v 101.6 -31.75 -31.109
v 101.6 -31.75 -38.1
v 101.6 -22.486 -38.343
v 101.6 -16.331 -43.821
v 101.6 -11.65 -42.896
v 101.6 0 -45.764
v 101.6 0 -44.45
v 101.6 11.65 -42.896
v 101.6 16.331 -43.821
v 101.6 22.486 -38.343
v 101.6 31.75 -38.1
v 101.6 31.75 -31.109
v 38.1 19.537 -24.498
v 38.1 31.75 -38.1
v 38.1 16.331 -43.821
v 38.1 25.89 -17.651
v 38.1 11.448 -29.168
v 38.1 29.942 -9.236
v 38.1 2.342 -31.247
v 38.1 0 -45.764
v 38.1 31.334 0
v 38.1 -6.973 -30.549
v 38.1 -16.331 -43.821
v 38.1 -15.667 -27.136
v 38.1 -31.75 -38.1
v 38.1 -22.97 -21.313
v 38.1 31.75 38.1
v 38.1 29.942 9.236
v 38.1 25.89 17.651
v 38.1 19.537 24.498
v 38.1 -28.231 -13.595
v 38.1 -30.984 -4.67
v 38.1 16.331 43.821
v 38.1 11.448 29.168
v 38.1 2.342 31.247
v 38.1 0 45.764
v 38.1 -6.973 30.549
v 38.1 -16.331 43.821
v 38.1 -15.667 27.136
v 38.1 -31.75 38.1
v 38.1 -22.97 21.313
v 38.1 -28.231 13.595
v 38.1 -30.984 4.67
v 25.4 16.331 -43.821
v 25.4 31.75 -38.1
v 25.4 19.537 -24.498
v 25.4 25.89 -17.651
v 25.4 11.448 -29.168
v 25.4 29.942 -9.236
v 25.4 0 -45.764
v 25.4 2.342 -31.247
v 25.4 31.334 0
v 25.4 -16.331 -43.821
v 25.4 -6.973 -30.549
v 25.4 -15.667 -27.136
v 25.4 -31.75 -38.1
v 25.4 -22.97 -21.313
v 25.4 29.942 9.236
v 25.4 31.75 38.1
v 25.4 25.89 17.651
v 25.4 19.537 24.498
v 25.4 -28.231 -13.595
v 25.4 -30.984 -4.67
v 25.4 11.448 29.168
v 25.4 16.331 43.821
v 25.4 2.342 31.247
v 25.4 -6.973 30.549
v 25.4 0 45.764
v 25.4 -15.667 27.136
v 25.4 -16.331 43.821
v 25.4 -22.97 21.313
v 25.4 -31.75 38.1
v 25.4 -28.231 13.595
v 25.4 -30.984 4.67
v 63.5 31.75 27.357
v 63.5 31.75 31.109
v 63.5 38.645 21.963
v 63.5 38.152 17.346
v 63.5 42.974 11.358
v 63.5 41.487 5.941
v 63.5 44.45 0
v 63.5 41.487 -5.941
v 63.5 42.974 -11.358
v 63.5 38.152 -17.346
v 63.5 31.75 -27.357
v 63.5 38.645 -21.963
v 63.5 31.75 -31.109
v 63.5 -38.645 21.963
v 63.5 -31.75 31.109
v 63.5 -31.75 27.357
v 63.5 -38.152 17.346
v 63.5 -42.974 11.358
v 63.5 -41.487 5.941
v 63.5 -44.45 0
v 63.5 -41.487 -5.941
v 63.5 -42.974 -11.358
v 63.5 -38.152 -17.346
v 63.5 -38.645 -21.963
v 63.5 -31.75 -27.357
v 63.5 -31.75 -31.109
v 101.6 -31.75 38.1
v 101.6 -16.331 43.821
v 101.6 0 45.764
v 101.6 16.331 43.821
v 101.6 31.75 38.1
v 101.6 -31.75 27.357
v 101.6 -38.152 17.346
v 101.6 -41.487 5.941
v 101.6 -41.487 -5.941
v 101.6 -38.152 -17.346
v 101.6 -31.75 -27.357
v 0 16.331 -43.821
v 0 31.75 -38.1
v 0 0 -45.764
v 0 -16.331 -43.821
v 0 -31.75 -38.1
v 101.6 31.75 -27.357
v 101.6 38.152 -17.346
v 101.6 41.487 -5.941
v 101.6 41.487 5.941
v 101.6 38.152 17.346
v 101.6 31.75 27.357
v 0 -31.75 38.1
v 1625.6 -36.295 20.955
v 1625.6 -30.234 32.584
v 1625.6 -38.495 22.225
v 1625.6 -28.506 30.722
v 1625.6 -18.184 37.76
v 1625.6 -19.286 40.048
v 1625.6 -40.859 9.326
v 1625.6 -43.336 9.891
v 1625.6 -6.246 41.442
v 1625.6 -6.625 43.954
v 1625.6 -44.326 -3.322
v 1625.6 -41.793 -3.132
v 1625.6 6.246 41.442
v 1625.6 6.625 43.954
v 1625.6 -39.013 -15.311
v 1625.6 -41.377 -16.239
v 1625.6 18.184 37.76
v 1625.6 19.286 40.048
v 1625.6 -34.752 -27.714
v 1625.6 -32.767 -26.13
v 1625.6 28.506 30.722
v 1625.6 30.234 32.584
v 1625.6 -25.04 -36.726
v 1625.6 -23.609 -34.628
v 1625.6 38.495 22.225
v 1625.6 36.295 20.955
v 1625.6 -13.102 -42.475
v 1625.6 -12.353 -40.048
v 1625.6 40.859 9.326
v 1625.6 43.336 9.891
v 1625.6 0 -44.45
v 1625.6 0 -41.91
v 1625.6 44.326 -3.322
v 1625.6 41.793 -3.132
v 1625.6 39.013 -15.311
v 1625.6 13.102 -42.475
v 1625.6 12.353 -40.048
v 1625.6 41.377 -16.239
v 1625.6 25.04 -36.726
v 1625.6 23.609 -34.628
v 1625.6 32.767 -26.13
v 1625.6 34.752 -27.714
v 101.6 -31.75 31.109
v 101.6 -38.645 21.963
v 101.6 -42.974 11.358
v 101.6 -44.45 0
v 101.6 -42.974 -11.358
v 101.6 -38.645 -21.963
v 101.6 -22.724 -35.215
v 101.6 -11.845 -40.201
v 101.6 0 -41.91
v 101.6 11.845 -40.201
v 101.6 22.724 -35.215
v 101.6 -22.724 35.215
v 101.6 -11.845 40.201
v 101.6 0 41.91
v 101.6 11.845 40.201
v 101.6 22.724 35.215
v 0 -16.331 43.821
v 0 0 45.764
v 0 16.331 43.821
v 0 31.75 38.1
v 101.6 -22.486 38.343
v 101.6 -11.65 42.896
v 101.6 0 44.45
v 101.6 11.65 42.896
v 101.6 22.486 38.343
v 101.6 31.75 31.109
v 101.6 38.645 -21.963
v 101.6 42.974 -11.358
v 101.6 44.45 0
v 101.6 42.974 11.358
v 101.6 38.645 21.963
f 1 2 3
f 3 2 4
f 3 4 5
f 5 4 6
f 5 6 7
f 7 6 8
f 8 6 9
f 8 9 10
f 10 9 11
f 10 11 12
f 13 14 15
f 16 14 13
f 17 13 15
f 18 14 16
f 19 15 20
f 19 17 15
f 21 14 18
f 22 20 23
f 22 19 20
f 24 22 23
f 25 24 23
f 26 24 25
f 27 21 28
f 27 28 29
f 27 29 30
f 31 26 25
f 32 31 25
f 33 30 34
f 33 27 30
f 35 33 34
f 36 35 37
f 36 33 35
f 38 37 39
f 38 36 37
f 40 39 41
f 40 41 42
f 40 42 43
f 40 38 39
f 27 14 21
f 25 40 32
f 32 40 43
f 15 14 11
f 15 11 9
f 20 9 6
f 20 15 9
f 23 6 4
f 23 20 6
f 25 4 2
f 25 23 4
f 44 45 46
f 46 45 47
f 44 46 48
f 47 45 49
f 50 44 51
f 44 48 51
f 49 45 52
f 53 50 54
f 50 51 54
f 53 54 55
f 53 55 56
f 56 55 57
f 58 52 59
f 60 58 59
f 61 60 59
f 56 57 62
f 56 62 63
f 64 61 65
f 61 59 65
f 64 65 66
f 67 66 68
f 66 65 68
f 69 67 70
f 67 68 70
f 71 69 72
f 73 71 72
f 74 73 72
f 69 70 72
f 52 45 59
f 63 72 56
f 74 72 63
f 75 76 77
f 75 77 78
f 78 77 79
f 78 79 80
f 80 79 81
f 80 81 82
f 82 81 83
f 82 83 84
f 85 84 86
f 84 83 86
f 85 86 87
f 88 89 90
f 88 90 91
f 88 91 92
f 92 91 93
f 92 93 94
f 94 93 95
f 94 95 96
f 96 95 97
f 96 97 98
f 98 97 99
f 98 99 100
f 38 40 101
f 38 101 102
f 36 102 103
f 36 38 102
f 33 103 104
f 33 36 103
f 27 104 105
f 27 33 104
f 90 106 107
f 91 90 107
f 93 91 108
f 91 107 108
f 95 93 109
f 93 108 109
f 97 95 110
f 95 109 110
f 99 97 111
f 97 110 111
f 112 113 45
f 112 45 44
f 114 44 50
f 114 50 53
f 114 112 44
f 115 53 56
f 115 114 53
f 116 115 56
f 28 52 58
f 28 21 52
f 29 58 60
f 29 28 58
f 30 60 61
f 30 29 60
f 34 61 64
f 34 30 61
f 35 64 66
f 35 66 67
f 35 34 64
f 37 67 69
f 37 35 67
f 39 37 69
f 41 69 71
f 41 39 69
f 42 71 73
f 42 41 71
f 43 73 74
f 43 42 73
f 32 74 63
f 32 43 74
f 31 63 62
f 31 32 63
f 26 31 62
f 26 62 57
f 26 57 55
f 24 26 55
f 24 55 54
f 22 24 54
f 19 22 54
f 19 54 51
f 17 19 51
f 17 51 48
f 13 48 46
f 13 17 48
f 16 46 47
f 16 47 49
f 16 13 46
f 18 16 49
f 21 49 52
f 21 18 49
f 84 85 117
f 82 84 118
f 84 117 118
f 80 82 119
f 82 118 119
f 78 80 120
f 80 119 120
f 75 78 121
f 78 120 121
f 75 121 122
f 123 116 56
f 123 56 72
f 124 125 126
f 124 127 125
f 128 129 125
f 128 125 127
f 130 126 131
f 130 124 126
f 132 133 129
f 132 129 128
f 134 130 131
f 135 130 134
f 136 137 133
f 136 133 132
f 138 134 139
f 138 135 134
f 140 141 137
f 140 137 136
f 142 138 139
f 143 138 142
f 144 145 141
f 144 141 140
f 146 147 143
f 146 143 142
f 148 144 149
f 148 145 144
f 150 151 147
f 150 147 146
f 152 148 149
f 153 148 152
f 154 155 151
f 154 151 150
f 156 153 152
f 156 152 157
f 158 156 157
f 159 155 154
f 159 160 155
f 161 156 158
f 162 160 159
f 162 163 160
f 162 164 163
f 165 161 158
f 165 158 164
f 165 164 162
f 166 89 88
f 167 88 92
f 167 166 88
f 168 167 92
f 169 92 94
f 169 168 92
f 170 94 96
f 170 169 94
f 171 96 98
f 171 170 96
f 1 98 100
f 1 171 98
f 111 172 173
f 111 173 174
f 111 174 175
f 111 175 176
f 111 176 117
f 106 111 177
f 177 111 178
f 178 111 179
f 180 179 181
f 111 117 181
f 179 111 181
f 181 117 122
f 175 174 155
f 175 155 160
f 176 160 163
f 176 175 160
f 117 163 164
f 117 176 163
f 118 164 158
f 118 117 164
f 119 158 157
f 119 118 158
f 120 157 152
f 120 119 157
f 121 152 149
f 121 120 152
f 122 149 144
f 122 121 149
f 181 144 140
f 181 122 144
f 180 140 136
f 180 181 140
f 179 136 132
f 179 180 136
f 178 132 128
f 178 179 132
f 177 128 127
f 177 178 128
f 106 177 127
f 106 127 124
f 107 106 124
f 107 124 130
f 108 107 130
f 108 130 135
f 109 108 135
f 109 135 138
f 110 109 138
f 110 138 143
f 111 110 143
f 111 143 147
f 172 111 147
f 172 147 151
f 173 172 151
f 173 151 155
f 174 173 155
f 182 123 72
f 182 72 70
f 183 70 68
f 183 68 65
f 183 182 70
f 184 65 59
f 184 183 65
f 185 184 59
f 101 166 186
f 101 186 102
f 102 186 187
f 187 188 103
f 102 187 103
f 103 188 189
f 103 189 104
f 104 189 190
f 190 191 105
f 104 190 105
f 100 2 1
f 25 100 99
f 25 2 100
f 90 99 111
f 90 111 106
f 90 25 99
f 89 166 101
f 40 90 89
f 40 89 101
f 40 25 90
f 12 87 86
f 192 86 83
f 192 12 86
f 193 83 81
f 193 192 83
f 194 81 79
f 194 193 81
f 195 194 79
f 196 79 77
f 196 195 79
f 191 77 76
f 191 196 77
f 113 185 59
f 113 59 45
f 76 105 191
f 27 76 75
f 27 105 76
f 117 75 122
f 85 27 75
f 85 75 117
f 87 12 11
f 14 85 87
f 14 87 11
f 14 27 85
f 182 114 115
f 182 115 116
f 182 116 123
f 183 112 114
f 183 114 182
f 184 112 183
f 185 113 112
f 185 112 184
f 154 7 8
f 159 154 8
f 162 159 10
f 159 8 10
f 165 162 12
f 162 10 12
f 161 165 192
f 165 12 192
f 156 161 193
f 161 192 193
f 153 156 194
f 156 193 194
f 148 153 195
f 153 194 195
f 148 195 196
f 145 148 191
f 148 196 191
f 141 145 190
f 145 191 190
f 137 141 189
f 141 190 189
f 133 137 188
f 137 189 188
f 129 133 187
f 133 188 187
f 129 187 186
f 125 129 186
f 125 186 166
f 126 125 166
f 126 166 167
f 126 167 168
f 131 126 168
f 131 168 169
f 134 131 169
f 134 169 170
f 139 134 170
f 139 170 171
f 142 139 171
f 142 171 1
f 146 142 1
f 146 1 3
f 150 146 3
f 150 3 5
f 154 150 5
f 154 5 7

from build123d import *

# Parameters (mm, degrees)
BOSS_EXTRUDE1_DEPTH = 101.6
SKETCH2_W           = 12.7
SKETCH2_H           = 25.4
SKETCH3_R           = 44.45
SKETCH3_R_2         = 41.91
BOSS_EXTRUDE2_DEPTH = 1524
BOSS_EXTRUDE3_START = -38.1
SKETCH3_2_R         = 44.45
SKETCH3_2_R_2       = 41.91
BOSS_EXTRUDE3_DEPTH = 38.1


with BuildPart() as part:
    # Sketch1 → Boss-Extrude1 (new body)
    with BuildSketch(Plane(origin=(0, 0, 0), x_dir=(0, 0, -1), z_dir=(1, 0, 0))):
        with BuildLine():
            Line((-38.1, 31.75), (38.1, 31.75))
            ThreePointArc((38.1, 31.75), (45.764257606, 0), (38.1, -31.75))
            Line((38.1, -31.75), (-38.1, -31.75))
            ThreePointArc((-38.1, -31.75), (-45.764257606, 0), (-38.1, 31.75))
        make_face()
    extrude(amount=BOSS_EXTRUDE1_DEPTH)

    # Sketch2 → Cut-Revolve1 (revolve, cut)
    with BuildSketch(Plane.XY):
        with Locations((31.75, 44.034385241)):
            Rectangle(SKETCH2_W, SKETCH2_H)
    revolve(axis=Axis((-7.218985368, 0, 0), (1, 0, 0)), mode=Mode.SUBTRACT)

    # Sketch3 → Boss-Extrude2 (add)
    with BuildSketch(Plane(origin=(101.6, 0, 0), x_dir=(0, 0, -1), z_dir=(1, 0, 0))):
        Circle(SKETCH3_R)
        Circle(SKETCH3_R_2, mode=Mode.SUBTRACT)
    extrude(amount=BOSS_EXTRUDE2_DEPTH)

    # Sketch3<2> → Boss-Extrude3 (add)
    with BuildSketch(Plane(origin=(101.6, 0, 0), x_dir=(0, 0, -1), z_dir=(1, 0, 0)).offset(BOSS_EXTRUDE3_START)):
        Circle(SKETCH3_2_R)
        Circle(SKETCH3_2_R_2, mode=Mode.SUBTRACT)
    extrude(amount=BOSS_EXTRUDE3_DEPTH)


solid = part.part
